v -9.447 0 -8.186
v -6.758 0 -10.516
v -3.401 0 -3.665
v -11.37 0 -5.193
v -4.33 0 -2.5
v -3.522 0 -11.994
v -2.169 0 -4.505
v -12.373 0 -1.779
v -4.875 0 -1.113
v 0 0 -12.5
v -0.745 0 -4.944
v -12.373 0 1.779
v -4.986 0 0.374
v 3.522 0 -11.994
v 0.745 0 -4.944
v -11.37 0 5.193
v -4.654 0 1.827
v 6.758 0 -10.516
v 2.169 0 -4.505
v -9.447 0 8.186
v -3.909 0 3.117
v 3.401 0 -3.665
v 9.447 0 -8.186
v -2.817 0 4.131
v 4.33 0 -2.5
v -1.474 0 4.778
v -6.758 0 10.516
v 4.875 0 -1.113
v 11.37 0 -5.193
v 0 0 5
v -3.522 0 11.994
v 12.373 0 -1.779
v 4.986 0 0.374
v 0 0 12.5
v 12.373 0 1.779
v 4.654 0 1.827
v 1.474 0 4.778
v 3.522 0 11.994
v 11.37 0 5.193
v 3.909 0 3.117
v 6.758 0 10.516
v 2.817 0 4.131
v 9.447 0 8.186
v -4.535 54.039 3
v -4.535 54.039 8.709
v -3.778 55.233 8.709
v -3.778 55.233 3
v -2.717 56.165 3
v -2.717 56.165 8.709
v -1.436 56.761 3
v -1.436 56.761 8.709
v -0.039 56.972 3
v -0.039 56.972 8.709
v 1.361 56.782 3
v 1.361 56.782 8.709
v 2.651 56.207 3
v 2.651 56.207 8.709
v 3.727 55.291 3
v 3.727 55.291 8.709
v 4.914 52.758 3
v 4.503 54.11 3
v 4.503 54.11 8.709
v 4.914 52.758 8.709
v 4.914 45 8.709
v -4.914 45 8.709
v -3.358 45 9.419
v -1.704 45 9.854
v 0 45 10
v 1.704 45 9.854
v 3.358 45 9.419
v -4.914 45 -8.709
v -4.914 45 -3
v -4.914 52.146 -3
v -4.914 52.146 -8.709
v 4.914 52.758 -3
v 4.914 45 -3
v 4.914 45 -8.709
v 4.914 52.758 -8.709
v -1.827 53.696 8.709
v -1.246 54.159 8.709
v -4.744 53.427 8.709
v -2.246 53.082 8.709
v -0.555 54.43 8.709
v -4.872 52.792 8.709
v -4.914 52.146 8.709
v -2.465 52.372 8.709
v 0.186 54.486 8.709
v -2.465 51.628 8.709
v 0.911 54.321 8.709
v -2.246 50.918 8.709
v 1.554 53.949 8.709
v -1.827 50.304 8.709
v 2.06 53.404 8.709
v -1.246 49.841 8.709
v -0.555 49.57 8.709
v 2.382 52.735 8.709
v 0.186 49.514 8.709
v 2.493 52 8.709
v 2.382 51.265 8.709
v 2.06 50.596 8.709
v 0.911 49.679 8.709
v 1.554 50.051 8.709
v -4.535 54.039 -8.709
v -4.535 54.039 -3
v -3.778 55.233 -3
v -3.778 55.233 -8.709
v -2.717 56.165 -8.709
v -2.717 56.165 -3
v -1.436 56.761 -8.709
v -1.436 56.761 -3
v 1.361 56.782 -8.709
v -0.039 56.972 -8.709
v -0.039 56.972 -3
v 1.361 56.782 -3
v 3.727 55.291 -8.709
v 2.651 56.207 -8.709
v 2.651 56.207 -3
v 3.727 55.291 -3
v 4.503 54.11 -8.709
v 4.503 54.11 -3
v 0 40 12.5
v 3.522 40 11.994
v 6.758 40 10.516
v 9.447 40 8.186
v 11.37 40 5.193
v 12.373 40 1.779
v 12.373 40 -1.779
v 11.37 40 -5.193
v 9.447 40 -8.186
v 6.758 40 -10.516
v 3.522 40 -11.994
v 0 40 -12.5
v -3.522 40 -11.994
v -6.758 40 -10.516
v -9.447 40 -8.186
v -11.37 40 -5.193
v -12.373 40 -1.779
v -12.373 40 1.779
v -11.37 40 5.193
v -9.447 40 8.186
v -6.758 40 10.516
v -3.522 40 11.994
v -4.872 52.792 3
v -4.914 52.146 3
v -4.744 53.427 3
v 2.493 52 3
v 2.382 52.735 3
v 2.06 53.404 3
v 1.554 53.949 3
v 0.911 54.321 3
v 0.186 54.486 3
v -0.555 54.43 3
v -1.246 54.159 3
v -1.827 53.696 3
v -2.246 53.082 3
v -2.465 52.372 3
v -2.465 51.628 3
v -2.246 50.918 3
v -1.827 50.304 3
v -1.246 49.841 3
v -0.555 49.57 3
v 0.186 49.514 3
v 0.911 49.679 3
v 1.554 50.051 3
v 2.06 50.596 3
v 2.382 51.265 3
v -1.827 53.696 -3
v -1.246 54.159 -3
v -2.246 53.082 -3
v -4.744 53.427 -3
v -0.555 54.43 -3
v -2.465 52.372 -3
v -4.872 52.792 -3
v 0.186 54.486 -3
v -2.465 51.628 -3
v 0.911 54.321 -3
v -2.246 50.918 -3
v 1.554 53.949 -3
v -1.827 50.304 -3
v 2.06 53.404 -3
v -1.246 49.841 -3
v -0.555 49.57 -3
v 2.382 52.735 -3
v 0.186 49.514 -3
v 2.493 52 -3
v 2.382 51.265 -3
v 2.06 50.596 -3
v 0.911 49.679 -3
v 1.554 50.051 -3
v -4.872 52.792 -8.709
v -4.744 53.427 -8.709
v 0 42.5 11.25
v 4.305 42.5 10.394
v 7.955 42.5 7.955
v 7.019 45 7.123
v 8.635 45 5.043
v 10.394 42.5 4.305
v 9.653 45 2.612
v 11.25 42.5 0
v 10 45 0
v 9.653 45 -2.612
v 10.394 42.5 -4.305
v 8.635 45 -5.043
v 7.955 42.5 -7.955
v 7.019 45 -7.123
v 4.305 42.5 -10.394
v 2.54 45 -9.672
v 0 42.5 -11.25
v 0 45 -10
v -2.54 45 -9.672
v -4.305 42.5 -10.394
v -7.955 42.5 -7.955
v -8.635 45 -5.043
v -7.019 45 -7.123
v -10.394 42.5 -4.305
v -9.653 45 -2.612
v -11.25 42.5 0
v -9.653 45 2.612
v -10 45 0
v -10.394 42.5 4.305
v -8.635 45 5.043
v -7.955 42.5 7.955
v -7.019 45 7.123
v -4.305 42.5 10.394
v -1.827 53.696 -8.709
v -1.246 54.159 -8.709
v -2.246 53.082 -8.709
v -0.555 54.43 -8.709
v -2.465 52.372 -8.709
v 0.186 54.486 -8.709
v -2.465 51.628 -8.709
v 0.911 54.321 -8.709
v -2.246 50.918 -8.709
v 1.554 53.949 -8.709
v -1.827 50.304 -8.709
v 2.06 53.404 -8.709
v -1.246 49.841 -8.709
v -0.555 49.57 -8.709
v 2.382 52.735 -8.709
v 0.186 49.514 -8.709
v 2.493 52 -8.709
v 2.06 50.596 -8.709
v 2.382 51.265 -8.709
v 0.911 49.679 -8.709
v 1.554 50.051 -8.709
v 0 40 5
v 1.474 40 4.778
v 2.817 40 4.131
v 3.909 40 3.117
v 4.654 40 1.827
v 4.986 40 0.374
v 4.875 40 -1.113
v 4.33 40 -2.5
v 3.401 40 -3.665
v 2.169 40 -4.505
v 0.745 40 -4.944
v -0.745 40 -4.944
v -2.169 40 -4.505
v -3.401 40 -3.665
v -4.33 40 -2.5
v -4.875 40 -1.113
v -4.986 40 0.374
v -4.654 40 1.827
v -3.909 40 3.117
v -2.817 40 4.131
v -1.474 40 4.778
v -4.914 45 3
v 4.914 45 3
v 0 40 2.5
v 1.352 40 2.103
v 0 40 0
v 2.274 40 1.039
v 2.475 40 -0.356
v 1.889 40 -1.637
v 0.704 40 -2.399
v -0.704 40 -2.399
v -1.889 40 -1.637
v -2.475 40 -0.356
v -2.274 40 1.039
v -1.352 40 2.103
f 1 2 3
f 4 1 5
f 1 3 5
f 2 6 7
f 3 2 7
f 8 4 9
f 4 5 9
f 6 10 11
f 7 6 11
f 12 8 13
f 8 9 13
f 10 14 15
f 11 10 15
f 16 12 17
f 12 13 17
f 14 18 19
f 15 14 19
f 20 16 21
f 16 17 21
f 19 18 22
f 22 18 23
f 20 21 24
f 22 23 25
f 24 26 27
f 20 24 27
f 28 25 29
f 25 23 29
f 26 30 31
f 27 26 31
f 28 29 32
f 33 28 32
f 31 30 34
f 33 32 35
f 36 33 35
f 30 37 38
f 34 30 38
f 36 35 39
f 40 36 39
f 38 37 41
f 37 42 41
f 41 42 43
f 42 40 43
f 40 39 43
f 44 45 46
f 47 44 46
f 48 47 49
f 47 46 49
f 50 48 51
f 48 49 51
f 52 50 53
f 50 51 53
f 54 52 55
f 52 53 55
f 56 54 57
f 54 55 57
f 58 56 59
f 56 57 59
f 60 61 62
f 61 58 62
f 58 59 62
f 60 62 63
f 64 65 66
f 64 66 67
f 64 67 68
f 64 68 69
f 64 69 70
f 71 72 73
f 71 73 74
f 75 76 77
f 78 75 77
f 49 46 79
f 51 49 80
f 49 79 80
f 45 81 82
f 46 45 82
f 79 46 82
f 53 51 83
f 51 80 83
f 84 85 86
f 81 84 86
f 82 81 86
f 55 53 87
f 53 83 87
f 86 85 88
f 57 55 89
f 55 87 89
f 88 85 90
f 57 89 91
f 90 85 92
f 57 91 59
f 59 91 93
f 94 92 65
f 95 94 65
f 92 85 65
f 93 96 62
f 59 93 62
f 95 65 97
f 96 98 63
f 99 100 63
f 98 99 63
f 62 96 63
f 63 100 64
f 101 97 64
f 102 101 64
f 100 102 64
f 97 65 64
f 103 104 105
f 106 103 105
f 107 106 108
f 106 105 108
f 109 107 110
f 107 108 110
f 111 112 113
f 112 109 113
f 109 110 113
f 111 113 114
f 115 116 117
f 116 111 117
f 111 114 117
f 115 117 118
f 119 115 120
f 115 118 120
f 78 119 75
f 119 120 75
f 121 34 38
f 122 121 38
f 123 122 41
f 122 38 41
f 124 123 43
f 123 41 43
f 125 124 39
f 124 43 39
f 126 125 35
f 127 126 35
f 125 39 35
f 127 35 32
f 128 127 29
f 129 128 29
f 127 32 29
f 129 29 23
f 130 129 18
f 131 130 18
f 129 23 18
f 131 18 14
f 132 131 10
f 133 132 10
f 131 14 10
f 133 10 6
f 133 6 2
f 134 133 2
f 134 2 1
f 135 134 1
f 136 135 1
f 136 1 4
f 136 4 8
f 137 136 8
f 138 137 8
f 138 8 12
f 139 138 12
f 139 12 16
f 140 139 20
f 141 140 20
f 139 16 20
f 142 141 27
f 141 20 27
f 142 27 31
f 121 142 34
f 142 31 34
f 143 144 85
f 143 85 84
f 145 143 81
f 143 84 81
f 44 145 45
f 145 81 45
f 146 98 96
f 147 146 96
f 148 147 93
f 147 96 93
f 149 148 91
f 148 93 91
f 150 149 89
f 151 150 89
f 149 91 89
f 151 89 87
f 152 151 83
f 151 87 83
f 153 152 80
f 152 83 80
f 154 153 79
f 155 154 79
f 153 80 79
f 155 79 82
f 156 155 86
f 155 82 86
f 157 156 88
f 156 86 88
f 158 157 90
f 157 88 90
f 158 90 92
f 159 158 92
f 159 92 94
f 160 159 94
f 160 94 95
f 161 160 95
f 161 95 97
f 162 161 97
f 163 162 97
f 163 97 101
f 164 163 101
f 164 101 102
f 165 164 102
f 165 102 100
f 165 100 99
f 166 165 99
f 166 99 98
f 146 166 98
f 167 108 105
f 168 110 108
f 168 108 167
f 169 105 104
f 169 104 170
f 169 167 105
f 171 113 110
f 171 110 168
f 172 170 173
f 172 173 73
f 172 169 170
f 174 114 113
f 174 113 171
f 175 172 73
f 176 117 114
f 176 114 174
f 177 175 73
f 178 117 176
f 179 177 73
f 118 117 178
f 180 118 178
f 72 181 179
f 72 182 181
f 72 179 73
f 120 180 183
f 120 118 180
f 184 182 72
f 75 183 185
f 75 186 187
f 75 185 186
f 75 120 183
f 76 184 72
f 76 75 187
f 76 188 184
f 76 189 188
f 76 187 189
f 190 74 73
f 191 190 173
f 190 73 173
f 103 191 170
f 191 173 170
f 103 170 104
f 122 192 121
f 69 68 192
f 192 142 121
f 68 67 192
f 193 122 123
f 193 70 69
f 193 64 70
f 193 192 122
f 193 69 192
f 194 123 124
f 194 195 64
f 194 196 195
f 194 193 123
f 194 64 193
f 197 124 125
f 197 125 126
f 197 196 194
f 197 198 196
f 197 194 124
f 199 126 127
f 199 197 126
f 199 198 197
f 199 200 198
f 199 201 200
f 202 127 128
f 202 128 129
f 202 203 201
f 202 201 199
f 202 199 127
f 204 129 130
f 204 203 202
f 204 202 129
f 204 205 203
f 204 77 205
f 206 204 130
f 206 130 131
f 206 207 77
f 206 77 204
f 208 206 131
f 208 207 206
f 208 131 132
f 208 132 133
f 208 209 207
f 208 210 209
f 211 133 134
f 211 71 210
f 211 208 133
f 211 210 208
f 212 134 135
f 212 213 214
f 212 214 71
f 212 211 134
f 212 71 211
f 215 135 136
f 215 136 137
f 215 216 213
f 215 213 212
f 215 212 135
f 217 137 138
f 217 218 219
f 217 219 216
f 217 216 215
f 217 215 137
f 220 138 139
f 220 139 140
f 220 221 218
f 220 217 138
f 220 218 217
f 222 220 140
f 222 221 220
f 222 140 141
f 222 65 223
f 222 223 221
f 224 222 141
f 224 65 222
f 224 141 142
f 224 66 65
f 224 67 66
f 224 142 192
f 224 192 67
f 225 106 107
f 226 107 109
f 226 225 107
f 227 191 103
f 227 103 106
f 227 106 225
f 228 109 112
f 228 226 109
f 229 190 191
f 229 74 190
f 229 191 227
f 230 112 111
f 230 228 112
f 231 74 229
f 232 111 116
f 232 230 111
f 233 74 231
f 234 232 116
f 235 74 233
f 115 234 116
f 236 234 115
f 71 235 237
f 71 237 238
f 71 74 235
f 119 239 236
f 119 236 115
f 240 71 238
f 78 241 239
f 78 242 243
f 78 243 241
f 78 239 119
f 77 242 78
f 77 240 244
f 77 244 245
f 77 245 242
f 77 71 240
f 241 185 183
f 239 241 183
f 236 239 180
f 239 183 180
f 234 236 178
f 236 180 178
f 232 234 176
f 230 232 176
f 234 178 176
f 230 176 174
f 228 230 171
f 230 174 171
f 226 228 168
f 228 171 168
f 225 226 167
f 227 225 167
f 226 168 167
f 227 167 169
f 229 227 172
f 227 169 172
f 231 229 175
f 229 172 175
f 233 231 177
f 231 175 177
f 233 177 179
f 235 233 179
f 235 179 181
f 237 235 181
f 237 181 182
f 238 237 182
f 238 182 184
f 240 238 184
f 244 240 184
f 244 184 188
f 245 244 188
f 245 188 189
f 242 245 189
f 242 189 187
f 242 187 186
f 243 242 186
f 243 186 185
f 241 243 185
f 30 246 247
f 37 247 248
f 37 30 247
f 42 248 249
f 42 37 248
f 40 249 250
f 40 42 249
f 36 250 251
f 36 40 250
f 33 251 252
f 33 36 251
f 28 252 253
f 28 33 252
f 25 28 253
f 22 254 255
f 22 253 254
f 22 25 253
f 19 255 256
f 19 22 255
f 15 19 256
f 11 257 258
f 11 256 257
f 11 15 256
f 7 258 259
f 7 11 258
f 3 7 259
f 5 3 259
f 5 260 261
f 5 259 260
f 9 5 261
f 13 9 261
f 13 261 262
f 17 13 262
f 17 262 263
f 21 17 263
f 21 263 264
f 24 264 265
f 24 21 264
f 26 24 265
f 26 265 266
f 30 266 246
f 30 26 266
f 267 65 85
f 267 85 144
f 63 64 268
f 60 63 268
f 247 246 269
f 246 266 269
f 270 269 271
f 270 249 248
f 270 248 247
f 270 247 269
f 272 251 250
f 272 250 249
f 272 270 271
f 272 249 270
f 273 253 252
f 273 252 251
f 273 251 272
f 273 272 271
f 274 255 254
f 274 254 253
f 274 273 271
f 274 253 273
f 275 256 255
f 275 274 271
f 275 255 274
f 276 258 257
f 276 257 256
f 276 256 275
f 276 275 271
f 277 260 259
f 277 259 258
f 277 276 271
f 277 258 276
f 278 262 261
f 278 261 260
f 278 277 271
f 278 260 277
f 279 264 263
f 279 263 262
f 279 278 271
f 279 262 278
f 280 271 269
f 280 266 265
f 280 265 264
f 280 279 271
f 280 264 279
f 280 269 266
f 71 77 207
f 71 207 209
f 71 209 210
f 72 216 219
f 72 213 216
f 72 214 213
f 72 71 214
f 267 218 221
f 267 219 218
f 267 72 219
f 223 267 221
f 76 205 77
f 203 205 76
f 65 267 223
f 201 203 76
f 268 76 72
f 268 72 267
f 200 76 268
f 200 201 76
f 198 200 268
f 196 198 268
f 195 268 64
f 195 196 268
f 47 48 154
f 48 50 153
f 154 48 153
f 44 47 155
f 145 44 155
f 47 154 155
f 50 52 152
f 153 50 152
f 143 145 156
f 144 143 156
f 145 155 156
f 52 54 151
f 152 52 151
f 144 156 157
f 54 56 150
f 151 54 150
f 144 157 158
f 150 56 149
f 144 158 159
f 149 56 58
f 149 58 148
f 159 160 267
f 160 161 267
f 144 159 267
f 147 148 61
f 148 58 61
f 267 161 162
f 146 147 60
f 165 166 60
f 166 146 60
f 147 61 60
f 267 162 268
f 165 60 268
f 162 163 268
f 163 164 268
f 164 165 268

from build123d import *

# Parameters (mm, degrees)
SKETCH_1_R          = 12.5
SKETCH_1_R_2        = 5
EXTRUDE_1_DEPTH     = 40
SKETCH_9_W          = 9.82849153
SKETCH_9_H          = 17.418402746
EXTRUDE_4_DEPTH     = 15
SKETCH_12_R         = 2.492986731
CUT_EXTRUDE_2_DEPTH = 65.854299957
CUT_EXTRUDE_3_DEPTH = 65.854299957
CUT_EXTRUDE_4_DEPTH = 65.854299957
CUT_EXTRUDE_5_DEPTH = 15


with BuildPart() as part:
    # Эскиз1 → Бобышка-Вытянуть1 (new body)
    with BuildSketch(Plane(origin=(0, 0, 0), x_dir=(1, 0, 0), z_dir=(0, 1, 0))):
        Circle(SKETCH_1_R)
        Circle(SKETCH_1_R_2, mode=Mode.SUBTRACT)
    extrude(amount=EXTRUDE_1_DEPTH)

    # Эскиз4 → Повернуть2 (revolve)
    with BuildSketch(Plane(origin=(0, 0, 0), x_dir=(0, 0, -1), z_dir=(1, 0, 0))):
        Polygon((-10, 45), (0, 45), (0, 39.999913314), (-12.5, 40), align=None)
    revolve(axis=Axis((0, 39.999913314, 0), (0, 1, 0)))

    # Эскиз9 → Бобышка-Вытянуть4 (add)
    with BuildSketch(Plane(origin=(0, 45, 0), x_dir=(1, 0, 0), z_dir=(0, 1, 0))):
        Rectangle(SKETCH_9_W, SKETCH_9_H)
    extrude(amount=EXTRUDE_4_DEPTH)

    # Эскиз12 → Вырез-Вытянуть2 (cut, through all)
    with BuildSketch(Plane.XY.offset(8.709201373)):
        with Locations((0, 52)):
            Circle(SKETCH_12_R)
    extrude(amount=-CUT_EXTRUDE_2_DEPTH, mode=Mode.SUBTRACT)

    # Эскиз12<4> → Вырез-Вытянуть3 (cut, through all)
    with BuildSketch(Plane.XY.offset(8.709201373)):
        with BuildLine():
            Line((0, 57.060476342), (0, 60))
            Line((0, 60), (-4.914245765, 60))
            Line((-4.914245765, 60), (-4.914245765, 52.146230577))
            ThreePointArc((-4.914245765, 52.146230577), (-3.474896505, 55.621127082), (0, 57.060476342))
        make_face()
    extrude(amount=-CUT_EXTRUDE_3_DEPTH, mode=Mode.SUBTRACT)

    # Эскиз14 → Вырез-Вытянуть4 (cut, through all)
    with BuildSketch(Plane.XY.offset(8.709201373)):
        with BuildLine():
            ThreePointArc((-4.534941492, 54.039407036), (0.668025232, 56.927333729), (4.914245765, 52.758329712))
            Line((4.914245765, 52.758329712), (4.914245765, 53.845840784))
            Line((4.914245765, 53.845840784), (4.914245765, 60))
            Line((4.914245765, 60), (0, 60))
            Line((0, 60), (0, 57.060476342))
            ThreePointArc((0, 57.060476342), (-2.724543727, 56.236056113), (-4.534941492, 54.039407036))
        make_face()
    extrude(amount=-CUT_EXTRUDE_4_DEPTH, mode=Mode.SUBTRACT)

    # Эскиз15 → Вырез-Вытянуть5 (cut)
    with BuildSketch(Plane(origin=(4.914245765, 0, 0), x_dir=(0, 0, -1), z_dir=(1, 0, 0))):
        Polygon((-3, 45), (-3, 52.758329712), (-3, 60.738034658), (3, 60.738034658), (3, 45), (0, 45), align=None)
    extrude(amount=-CUT_EXTRUDE_5_DEPTH, mode=Mode.SUBTRACT)


solid = part.part
